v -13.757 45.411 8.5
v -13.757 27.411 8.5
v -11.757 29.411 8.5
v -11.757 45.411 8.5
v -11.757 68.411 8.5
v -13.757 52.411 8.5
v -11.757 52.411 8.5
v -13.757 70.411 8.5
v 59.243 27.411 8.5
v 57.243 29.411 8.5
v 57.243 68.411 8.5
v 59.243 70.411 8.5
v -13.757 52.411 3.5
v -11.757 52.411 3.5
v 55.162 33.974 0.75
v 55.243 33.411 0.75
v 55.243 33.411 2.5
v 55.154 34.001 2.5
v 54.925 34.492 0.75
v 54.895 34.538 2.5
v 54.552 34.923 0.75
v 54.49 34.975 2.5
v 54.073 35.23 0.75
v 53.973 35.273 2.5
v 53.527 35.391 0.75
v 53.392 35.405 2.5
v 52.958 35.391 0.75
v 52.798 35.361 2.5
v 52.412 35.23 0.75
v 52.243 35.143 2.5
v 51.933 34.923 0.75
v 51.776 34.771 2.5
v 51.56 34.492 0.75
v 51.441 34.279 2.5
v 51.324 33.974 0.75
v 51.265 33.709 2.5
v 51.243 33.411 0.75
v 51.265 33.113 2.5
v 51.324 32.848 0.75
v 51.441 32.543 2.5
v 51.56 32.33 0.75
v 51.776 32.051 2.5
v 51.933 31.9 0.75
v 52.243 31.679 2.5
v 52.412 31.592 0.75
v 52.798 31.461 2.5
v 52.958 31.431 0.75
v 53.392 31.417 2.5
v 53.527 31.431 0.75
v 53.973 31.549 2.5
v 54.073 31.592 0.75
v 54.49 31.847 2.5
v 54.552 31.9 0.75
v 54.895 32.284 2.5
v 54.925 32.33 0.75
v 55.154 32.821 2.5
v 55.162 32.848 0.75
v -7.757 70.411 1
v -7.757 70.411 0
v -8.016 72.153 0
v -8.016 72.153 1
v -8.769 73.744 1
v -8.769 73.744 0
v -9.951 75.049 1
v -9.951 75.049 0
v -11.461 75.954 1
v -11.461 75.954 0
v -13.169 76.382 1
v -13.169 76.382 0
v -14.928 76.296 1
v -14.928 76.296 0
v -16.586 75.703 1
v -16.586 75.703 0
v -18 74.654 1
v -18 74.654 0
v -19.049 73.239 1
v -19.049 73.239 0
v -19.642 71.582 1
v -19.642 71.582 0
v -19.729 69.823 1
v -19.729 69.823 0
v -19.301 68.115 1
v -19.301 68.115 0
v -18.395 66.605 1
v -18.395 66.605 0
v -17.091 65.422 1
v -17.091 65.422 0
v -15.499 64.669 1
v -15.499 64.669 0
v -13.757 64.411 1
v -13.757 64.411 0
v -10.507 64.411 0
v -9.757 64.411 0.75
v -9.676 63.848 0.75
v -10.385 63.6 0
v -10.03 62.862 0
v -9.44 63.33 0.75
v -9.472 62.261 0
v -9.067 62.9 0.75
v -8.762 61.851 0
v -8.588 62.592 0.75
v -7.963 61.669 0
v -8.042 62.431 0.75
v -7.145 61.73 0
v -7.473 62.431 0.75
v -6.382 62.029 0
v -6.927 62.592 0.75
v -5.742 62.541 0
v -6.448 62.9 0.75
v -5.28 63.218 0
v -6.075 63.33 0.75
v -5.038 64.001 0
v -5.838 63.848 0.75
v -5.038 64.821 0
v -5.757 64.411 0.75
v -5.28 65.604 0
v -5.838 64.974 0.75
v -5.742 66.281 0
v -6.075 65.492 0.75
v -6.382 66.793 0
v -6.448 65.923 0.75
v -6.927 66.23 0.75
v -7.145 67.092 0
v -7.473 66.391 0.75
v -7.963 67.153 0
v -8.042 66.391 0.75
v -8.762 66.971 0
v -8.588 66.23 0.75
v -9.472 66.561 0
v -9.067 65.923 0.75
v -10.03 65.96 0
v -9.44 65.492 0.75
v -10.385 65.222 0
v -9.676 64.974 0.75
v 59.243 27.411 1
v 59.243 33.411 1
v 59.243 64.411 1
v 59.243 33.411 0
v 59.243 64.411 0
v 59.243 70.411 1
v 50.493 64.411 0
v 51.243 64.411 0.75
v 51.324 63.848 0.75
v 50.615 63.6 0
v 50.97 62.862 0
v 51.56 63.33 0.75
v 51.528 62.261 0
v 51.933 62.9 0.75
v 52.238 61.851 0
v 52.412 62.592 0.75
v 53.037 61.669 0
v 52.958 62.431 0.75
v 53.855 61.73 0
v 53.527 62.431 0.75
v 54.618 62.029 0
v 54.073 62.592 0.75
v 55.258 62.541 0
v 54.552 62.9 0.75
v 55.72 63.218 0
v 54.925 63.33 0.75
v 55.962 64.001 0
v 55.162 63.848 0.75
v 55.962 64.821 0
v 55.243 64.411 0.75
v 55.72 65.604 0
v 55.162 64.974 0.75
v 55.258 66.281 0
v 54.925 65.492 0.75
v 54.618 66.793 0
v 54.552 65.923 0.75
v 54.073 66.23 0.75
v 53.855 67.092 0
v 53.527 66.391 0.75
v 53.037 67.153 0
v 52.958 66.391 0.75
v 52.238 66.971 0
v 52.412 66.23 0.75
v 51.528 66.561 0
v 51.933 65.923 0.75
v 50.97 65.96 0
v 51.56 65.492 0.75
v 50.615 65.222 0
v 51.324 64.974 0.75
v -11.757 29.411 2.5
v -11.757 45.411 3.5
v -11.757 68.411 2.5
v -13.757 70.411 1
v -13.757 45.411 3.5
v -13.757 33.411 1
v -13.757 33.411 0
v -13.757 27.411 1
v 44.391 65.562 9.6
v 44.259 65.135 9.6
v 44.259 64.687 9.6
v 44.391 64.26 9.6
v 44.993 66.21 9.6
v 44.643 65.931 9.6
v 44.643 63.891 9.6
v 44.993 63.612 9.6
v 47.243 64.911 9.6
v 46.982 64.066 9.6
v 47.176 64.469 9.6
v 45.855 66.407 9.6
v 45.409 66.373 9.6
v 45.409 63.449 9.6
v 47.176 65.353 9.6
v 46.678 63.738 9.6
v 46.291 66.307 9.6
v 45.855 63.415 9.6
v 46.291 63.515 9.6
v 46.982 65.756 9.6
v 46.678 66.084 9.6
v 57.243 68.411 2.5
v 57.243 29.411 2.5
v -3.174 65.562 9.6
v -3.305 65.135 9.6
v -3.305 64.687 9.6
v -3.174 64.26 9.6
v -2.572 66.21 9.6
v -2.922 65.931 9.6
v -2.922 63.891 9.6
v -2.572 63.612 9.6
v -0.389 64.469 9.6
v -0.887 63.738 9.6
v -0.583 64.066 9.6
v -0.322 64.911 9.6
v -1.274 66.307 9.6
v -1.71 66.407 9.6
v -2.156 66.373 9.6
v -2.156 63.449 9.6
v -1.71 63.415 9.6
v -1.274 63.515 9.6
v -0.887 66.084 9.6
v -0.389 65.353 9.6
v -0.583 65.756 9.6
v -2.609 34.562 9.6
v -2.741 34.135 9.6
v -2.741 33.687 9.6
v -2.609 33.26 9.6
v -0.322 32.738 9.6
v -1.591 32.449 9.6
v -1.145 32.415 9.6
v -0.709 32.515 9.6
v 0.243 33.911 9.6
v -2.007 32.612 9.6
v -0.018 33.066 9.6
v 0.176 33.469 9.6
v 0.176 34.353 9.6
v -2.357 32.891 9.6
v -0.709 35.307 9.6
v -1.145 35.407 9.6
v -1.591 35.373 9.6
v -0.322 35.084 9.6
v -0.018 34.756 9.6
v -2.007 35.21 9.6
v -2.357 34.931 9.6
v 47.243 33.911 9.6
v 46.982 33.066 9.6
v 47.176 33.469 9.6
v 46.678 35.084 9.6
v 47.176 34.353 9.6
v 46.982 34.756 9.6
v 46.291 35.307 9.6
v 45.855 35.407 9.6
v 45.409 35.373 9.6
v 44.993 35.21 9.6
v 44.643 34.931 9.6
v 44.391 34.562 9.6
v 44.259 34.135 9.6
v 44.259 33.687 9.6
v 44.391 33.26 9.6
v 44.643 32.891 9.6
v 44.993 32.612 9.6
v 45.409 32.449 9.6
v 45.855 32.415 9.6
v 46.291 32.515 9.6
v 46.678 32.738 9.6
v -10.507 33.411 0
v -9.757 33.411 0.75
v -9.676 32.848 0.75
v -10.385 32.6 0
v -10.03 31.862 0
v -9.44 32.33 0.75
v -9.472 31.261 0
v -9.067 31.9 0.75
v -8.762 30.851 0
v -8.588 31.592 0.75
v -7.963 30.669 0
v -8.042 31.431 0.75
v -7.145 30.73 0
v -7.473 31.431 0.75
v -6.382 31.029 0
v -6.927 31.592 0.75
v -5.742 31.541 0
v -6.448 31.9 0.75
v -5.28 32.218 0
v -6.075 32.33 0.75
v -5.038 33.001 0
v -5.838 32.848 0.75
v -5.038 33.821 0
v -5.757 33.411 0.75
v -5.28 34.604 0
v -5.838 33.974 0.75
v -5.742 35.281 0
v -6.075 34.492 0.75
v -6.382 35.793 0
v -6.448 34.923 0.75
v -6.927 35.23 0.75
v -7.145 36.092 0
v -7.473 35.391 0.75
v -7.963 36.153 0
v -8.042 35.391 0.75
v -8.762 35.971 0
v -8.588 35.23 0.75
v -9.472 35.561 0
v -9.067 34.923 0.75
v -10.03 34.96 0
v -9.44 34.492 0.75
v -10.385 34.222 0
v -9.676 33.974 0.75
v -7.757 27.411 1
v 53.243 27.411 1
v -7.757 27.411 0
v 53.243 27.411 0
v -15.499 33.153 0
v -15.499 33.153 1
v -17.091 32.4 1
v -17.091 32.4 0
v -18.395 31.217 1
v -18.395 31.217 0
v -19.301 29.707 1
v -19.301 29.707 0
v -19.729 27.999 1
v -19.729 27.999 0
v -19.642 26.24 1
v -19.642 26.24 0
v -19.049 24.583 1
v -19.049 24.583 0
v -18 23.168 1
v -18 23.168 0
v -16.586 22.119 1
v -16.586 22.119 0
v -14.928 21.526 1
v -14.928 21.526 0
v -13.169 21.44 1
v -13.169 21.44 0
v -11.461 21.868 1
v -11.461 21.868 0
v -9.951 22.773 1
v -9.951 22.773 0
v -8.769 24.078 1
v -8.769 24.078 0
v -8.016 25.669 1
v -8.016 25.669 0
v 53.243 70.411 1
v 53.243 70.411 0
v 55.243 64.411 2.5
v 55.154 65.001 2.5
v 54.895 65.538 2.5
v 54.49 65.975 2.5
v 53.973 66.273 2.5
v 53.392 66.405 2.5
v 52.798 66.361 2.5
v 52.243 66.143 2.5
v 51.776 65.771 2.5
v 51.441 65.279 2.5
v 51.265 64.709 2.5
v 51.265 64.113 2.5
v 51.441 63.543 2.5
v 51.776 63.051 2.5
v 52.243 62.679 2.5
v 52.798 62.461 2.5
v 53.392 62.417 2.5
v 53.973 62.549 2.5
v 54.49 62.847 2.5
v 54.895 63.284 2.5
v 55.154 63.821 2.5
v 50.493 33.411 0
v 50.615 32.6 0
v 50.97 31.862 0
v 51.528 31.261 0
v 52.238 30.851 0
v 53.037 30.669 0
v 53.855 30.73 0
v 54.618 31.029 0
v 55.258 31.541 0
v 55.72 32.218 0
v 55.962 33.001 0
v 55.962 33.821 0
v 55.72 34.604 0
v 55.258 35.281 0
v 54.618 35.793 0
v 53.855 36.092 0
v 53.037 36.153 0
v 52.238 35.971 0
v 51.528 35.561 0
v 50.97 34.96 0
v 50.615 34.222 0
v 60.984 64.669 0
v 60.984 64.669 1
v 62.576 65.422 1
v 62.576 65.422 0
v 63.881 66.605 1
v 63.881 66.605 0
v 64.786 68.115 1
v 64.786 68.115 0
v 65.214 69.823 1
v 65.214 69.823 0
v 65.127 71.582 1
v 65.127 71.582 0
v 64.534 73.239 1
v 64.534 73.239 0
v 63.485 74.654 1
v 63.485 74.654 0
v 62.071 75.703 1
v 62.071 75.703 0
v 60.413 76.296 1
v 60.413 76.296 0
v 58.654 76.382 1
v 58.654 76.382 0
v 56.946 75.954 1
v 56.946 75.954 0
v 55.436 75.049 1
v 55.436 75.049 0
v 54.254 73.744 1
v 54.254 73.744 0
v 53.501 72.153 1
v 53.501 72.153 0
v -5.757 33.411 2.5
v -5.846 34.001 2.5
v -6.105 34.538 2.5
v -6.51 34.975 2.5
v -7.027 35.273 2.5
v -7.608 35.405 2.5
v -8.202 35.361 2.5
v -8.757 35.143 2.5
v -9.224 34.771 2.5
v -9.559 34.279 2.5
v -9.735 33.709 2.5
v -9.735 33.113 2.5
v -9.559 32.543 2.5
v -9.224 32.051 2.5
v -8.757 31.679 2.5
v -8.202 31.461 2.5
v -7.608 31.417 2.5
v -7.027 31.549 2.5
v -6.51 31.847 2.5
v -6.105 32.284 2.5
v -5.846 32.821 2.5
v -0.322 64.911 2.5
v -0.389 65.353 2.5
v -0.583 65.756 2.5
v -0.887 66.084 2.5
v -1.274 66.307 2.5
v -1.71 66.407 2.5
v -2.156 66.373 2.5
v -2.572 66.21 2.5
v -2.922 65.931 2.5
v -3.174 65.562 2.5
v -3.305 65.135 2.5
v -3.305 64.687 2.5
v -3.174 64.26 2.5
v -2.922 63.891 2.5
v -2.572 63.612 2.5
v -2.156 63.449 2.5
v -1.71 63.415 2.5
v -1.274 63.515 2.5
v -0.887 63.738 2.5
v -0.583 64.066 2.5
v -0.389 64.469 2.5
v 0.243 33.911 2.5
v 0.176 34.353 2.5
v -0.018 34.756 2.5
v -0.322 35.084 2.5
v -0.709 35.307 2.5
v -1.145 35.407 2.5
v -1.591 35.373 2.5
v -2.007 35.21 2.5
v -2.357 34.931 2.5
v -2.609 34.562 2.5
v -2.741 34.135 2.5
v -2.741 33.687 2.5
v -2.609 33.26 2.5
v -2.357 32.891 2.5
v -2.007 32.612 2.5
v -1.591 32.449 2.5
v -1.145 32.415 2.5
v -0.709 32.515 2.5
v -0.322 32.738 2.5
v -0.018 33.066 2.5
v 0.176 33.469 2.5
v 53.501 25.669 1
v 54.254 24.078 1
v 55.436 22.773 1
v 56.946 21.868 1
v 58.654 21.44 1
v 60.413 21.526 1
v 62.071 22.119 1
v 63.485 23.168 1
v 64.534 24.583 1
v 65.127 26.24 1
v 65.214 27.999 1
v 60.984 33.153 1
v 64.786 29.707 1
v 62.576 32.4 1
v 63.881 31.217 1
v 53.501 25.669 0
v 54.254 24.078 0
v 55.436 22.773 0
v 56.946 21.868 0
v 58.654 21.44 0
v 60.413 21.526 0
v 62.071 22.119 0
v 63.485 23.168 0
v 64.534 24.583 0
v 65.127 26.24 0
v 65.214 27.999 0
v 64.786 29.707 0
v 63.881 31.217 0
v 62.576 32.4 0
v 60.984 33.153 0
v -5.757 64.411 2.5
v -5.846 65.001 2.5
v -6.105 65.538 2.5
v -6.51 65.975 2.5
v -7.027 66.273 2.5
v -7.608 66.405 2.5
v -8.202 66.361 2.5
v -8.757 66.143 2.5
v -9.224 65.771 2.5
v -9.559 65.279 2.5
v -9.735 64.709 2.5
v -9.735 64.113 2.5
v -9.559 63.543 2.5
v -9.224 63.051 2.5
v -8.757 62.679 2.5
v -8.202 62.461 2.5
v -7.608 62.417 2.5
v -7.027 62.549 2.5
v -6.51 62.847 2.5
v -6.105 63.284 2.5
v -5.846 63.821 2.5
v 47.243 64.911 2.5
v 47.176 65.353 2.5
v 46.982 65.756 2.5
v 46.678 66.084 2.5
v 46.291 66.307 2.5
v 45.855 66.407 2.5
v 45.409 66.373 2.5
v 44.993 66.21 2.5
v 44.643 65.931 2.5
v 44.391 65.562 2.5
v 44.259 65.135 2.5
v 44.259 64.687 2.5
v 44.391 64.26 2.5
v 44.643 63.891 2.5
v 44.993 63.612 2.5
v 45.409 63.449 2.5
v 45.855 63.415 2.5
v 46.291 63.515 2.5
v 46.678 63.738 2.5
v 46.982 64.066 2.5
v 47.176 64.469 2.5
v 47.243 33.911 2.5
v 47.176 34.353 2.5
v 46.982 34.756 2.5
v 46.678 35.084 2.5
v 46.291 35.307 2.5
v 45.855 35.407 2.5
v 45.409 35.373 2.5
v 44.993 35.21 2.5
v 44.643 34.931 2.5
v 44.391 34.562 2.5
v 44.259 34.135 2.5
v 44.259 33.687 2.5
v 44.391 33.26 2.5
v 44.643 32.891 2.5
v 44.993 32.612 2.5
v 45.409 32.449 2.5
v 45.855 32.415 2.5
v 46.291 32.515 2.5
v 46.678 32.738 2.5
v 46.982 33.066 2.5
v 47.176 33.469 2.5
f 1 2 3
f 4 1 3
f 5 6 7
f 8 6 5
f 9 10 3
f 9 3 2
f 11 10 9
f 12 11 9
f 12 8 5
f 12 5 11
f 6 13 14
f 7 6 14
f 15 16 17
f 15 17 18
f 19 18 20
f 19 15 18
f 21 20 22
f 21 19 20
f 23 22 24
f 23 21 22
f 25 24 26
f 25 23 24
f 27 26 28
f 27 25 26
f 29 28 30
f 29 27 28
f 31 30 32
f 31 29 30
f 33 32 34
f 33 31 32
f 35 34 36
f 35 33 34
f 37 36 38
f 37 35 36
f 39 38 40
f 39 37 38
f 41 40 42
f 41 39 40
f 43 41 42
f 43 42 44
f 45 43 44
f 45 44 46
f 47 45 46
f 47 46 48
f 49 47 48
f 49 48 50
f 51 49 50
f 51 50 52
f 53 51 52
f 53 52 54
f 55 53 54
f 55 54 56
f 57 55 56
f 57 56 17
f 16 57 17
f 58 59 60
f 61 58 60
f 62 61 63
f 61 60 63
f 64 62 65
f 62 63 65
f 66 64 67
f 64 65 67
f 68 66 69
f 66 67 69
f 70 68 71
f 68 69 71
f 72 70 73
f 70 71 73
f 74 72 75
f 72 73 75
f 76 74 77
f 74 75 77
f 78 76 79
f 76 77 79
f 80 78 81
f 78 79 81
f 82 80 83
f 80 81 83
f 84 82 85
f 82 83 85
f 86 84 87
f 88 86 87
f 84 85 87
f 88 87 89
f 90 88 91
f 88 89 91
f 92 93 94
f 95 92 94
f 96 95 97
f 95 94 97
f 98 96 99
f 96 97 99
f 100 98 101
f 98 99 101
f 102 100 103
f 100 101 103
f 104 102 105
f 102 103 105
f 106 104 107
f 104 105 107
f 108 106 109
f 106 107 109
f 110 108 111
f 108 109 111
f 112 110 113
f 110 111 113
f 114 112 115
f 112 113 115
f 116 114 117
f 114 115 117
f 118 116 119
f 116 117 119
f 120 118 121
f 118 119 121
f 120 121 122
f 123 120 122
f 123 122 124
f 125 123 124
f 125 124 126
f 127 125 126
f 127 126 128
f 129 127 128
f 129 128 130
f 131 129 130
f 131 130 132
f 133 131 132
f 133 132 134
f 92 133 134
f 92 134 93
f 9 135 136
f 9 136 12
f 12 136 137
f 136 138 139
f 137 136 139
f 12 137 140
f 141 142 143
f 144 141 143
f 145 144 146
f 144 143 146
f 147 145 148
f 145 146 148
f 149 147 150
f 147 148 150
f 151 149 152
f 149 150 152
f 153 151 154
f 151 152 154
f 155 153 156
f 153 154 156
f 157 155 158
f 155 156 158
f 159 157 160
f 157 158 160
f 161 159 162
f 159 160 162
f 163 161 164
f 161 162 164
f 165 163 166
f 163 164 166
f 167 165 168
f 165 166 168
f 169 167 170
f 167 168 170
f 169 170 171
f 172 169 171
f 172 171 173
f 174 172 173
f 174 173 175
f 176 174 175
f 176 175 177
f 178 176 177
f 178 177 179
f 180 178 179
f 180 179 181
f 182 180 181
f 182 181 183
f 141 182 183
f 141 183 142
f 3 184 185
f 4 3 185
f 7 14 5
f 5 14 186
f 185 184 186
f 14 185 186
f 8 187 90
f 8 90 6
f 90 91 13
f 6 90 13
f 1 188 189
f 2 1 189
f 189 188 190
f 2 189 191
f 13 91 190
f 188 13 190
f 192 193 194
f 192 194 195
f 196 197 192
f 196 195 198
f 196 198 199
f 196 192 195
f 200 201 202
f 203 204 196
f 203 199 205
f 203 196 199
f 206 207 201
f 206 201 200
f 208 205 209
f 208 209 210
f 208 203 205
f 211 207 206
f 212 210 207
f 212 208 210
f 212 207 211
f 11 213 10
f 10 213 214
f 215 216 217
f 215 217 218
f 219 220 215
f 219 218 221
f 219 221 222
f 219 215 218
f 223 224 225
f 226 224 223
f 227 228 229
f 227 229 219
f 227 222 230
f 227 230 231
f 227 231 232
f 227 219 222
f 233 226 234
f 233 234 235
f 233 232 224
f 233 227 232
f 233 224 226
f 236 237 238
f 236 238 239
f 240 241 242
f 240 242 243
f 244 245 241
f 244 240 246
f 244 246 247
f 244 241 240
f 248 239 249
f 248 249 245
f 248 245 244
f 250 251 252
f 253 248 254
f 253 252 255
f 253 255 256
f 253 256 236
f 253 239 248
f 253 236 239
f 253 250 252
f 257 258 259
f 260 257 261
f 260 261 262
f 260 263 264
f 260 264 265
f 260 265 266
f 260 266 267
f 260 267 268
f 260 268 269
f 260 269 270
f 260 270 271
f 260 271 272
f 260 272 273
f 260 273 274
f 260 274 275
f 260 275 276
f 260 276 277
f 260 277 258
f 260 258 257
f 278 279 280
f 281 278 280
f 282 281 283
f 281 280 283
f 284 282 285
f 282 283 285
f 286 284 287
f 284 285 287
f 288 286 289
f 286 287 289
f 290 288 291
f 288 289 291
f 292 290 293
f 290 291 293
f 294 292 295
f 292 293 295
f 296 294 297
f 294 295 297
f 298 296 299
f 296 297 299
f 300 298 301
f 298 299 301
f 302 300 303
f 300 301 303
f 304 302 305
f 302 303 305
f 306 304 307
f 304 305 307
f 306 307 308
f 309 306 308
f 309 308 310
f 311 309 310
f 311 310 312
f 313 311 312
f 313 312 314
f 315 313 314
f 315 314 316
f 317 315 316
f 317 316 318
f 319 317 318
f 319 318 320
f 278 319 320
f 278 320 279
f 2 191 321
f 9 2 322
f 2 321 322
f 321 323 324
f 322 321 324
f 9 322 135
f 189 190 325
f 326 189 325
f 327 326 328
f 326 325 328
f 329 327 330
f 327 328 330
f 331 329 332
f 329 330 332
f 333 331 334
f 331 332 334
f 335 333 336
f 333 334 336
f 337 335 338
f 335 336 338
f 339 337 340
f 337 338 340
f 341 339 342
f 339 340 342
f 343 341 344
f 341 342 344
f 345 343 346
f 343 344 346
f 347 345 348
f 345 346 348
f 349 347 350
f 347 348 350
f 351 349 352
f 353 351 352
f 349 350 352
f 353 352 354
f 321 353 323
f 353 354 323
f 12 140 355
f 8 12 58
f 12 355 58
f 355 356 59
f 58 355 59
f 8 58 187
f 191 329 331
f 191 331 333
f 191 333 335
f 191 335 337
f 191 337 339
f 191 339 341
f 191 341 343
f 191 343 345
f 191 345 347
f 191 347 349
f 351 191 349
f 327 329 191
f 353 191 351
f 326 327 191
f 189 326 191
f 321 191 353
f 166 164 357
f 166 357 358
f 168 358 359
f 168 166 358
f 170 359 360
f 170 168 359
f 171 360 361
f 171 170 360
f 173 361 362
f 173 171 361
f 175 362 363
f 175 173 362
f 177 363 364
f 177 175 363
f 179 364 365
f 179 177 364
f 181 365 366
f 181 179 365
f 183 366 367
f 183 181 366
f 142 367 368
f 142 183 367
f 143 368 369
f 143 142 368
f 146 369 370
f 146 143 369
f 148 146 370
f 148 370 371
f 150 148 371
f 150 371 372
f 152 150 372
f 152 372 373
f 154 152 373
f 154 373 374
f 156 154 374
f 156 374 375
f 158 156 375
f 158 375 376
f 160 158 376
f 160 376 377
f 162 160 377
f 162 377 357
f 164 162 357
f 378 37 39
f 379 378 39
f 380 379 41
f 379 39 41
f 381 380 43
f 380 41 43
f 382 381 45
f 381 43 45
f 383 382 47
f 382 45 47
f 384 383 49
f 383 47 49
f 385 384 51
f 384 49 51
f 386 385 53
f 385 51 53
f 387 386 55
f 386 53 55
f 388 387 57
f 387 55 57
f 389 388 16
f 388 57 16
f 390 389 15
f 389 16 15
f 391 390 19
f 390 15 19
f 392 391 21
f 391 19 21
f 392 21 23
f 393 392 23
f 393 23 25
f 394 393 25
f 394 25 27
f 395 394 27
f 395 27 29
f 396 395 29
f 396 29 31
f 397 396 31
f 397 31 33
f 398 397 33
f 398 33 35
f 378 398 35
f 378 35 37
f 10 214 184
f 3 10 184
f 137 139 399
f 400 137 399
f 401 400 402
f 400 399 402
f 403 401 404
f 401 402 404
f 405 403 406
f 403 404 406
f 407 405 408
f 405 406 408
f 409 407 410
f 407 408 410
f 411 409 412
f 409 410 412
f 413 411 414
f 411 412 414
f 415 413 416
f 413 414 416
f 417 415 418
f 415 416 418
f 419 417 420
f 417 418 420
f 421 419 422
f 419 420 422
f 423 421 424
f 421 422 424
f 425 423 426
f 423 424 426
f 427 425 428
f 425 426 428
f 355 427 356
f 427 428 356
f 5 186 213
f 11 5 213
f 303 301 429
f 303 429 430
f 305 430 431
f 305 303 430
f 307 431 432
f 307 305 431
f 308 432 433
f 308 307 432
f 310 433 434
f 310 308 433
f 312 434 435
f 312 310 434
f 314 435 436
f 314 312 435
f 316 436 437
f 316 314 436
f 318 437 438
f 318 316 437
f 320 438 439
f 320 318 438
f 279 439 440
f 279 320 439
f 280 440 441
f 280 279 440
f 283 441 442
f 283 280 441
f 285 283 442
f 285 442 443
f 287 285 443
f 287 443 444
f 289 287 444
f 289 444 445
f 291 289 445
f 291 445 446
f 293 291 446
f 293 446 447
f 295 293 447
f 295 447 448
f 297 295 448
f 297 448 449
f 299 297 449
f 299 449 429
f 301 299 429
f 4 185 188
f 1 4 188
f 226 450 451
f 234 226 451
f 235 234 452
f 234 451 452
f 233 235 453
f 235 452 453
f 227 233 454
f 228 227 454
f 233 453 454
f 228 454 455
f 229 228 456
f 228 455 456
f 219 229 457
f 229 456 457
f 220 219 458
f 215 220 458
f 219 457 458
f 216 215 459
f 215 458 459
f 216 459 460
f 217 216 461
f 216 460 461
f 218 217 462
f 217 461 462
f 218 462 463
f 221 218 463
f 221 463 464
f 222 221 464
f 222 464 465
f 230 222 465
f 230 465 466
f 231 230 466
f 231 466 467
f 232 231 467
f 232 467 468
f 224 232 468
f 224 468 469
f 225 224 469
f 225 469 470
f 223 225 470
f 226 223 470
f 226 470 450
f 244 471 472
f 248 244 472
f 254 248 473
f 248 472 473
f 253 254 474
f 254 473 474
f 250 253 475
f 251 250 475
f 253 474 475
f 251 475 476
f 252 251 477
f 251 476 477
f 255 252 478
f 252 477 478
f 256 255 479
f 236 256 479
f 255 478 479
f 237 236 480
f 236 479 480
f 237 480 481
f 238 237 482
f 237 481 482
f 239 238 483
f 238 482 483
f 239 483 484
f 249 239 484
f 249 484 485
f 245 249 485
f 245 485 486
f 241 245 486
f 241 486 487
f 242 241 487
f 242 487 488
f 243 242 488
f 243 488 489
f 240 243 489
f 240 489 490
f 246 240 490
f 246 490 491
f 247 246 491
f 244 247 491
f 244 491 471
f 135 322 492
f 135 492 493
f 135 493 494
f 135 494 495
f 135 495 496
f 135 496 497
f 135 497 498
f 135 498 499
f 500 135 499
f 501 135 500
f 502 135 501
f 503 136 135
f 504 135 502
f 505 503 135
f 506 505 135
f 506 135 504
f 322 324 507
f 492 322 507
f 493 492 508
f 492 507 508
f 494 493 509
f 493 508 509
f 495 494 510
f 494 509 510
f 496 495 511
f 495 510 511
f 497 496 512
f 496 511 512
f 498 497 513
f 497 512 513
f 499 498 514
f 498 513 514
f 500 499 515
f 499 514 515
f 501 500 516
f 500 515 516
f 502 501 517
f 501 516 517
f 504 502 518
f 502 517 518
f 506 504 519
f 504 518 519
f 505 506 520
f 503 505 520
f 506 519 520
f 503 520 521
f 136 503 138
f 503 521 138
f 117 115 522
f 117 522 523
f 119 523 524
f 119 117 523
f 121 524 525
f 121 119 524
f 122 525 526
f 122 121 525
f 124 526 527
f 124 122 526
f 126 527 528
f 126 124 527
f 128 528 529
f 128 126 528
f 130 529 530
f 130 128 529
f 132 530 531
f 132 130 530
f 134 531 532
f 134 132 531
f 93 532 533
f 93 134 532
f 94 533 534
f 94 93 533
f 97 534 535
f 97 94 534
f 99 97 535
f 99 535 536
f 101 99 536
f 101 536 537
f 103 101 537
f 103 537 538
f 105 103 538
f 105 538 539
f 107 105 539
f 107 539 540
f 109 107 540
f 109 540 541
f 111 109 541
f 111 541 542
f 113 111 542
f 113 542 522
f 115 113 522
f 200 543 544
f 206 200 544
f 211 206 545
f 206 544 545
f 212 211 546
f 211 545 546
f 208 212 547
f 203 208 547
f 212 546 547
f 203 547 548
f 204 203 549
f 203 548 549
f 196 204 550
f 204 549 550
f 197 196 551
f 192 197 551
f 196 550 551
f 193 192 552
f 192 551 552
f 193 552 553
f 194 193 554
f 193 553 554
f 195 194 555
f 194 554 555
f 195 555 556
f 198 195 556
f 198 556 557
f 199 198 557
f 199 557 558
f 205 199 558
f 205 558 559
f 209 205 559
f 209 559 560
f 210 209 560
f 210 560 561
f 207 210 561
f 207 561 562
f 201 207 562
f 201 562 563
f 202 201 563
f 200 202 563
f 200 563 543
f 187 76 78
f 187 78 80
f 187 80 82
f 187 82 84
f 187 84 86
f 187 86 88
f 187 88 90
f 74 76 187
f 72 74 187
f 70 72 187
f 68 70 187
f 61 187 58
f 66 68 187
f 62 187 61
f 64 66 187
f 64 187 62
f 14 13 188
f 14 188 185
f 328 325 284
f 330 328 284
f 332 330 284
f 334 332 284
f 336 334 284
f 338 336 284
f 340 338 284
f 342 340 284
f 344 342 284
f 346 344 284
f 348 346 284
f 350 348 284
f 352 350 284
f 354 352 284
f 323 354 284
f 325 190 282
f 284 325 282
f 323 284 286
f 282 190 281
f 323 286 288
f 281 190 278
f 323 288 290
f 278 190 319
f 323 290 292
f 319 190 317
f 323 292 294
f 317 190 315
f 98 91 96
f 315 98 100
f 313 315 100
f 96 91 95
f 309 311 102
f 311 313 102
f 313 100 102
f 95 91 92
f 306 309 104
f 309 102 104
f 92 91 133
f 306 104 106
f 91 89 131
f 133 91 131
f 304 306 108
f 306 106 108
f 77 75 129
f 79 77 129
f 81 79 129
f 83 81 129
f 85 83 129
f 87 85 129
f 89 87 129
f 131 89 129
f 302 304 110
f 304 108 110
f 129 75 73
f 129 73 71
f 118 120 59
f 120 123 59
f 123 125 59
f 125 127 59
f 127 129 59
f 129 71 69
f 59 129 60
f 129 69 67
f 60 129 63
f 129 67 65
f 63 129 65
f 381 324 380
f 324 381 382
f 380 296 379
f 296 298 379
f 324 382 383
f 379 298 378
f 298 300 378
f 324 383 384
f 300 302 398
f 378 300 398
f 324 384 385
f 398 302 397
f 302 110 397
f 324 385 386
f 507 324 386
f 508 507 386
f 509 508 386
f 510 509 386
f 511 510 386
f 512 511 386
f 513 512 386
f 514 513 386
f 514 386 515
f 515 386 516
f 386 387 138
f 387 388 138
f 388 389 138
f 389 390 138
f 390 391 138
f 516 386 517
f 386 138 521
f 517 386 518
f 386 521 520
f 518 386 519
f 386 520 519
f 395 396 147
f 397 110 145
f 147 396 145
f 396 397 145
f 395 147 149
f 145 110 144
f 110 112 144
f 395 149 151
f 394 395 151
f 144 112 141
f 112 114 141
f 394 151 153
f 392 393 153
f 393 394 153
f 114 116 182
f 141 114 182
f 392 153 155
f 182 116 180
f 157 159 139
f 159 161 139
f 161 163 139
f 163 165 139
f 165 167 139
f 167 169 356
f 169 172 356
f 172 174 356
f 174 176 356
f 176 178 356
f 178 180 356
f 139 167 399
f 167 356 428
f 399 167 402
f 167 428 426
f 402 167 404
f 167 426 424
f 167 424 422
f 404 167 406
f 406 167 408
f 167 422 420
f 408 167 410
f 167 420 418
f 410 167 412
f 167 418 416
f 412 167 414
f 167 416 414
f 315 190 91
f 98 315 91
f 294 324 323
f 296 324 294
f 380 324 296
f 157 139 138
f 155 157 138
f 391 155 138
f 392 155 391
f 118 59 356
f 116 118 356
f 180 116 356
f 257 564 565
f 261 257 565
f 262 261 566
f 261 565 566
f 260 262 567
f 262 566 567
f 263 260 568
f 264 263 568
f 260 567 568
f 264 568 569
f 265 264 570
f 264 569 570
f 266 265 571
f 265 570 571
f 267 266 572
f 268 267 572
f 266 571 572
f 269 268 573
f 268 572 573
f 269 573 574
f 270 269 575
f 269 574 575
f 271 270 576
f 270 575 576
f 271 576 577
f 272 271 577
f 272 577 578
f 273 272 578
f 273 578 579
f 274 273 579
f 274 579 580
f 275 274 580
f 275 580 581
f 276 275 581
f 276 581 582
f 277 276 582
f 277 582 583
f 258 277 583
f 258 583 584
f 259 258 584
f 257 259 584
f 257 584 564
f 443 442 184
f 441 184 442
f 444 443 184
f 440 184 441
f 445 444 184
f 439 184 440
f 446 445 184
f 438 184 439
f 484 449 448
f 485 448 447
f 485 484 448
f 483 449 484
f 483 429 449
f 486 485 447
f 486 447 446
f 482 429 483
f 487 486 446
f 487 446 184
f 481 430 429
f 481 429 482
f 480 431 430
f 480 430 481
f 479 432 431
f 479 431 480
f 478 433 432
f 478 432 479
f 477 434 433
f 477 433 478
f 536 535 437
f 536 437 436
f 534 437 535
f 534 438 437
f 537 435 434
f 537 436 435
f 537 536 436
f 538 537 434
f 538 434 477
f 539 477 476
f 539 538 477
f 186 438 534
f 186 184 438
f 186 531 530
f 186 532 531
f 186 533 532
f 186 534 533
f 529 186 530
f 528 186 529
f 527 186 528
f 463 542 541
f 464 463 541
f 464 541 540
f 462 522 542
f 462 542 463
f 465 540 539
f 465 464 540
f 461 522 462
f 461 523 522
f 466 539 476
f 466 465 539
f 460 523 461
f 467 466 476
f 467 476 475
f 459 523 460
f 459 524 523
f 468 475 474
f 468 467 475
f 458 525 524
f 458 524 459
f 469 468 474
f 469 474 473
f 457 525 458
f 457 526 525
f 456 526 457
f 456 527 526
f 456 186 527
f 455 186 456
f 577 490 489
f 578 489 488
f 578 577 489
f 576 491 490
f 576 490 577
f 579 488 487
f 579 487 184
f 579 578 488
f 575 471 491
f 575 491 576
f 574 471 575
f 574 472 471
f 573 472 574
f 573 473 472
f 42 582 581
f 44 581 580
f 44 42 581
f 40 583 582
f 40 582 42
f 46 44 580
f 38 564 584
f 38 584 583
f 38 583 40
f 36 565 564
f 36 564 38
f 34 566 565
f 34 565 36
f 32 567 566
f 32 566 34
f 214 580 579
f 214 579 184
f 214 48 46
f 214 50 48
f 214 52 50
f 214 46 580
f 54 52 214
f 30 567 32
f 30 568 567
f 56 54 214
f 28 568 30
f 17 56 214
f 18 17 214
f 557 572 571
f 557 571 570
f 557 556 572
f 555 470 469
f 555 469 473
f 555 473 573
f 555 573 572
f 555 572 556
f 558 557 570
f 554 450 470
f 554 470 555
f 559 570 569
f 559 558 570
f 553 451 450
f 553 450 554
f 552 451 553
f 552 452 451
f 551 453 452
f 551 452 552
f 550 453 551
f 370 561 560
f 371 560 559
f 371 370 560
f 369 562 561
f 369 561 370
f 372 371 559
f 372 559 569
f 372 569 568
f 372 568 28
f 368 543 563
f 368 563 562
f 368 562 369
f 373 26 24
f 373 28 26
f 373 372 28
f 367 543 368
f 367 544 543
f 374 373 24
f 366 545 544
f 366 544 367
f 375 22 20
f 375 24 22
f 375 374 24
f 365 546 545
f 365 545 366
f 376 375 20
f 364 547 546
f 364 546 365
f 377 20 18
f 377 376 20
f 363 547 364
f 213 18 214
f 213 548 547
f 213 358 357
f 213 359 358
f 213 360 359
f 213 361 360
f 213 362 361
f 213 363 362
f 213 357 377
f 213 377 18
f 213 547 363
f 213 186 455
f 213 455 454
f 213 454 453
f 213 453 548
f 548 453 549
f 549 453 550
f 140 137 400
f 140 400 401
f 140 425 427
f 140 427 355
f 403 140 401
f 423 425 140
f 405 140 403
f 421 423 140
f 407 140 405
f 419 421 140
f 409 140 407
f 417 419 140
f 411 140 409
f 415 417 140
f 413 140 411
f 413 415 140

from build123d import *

# Parameters (mm, degrees)
F0_R           = 2
F0_R_2         = 1.5
F0_W           = 2
F0_H           = 7
F1_DEPTH       = 2.5
F2_DEPTH       = 8.5
F3_DEPTH       = 9.6
F4_DEPTH       = 3.5
F5_D           = 3
F5_CSINK_D     = 5.5
F5_CSINK_ANGLE = 90
F6_DEPTH       = 1


with BuildPart() as f1:
    # F0 (on Top) → F1 (new body)
    with BuildSketch(Plane.XY):
        Polygon((57.2425711751, 68.4110085815), (-11.7574288249, 68.4110085815), (-11.7574288249, 52.4110085815), (-11.7574288249, 45.4110085815), (-11.7574288249, 29.4110085815), (57.2425711751, 29.4110085815), align=None)
        with Locations((-7.7574288249, 33.4110085815)):
            Circle(F0_R, mode=Mode.SUBTRACT)
        with Locations((-1.2574288249, 33.9110085815)):
            Circle(F0_R_2, mode=Mode.SUBTRACT)
        with Locations((45.7425711751, 33.9110085815)):
            Circle(F0_R_2, mode=Mode.SUBTRACT)
        with Locations((53.2425711751, 33.4110085815)):
            Circle(F0_R, mode=Mode.SUBTRACT)
        with Locations((-7.7574288249, 64.4110085815)):
            Circle(F0_R, mode=Mode.SUBTRACT)
        with Locations((-1.8220887287, 64.9110085815)):
            Circle(F0_R_2, mode=Mode.SUBTRACT)
        with Locations((45.7425711751, 64.9110085815)):
            Circle(F0_R_2, mode=Mode.SUBTRACT)
        with Locations((53.2425711751, 64.4110085815)):
            Circle(F0_R, mode=Mode.SUBTRACT)
        Polygon((-11.7574288249, 52.4110085815), (-11.7574288249, 68.4110085815), (57.2425711751, 68.4110085815), (57.2425711751, 29.4110085815), (-11.7574288249, 29.4110085815), (-11.7574288249, 45.4110085815), (-13.7574288249, 45.4110085815), (-13.7574288249, 33.4110085815), (-13.7574288249, 27.4110085815), (-7.7574288249, 27.4110085815), (53.2425711751, 27.4110085815), (59.2425711751, 27.4110085815), (59.2425711751, 33.4110085815), (59.2425711751, 64.4110085815), (59.2425711751, 70.4110085815), (53.2425711751, 70.4110085815), (-7.7574288249, 70.4110085815), (-13.7574288249, 70.4110085815), (-13.7574288249, 64.4110085815), (-13.7574288249, 52.4110085815), align=None)
        with Locations((-1.2574288249, 33.9110085815)):
            Circle(F0_R_2)
        with Locations((45.7425711751, 33.9110085815)):
            Circle(F0_R_2)
        with Locations((45.7425711751, 64.9110085815)):
            Circle(F0_R_2)
        with Locations((-1.8220887287, 64.9110085815)):
            Circle(F0_R_2)
        with Locations((-12.7574288249, 48.9110085815)):
            Rectangle(F0_W, F0_H)
    extrude(amount=F1_DEPTH)

    # F0 (on Top) → F2 (join)
    with BuildSketch(Plane.XY):
        Polygon((-11.7574288249, 52.4110085815), (-11.7574288249, 68.4110085815), (57.2425711751, 68.4110085815), (57.2425711751, 29.4110085815), (-11.7574288249, 29.4110085815), (-11.7574288249, 45.4110085815), (-13.7574288249, 45.4110085815), (-13.7574288249, 33.4110085815), (-13.7574288249, 27.4110085815), (-7.7574288249, 27.4110085815), (53.2425711751, 27.4110085815), (59.2425711751, 27.4110085815), (59.2425711751, 33.4110085815), (59.2425711751, 64.4110085815), (59.2425711751, 70.4110085815), (53.2425711751, 70.4110085815), (-7.7574288249, 70.4110085815), (-13.7574288249, 70.4110085815), (-13.7574288249, 64.4110085815), (-13.7574288249, 52.4110085815), align=None)
    extrude(amount=F2_DEPTH)

    # F0 (on Top) → F3 (join)
    with BuildSketch(Plane.XY):
        with Locations((-1.8220887287, 64.9110085815)):
            Circle(F0_R_2)
        with Locations((-1.2574288249, 33.9110085815)):
            Circle(F0_R_2)
        with Locations((45.7425711751, 33.9110085815)):
            Circle(F0_R_2)
        with Locations((45.7425711751, 64.9110085815)):
            Circle(F0_R_2)
    extrude(amount=F3_DEPTH)

    # F0 (on Top) → F4 (join)
    with BuildSketch(Plane.XY):
        with Locations((-12.7574288249, 48.9110085815)):
            Rectangle(F0_W, F0_H)
    extrude(amount=F4_DEPTH)

    # F5 (through all)
    with Locations(Plane(origin=(0, 0, 0), x_dir=(1, 0, 0), z_dir=(0, 0, -1))):
        with Locations((53.2425711751, -64.4110085815), (53.2425711751, -33.4110085815), (-7.7574288249, -33.4110085815), (-7.7574288249, -64.4110085815)):
            CounterSinkHole(F5_D / 2, F5_CSINK_D / 2, counter_sink_angle=F5_CSINK_ANGLE)

    # F0 (on Top) → F6 (join)
    with BuildSketch(Plane.XY):
        with BuildLine():
            ThreePointArc((-7.7574288249, 70.4110085815), (-18.000069512, 74.6536492686), (-13.7574288249, 64.4110085815))
            Line((-13.7574288249, 64.4110085815), (-13.7574288249, 70.4110085815))
            Line((-13.7574288249, 70.4110085815), (-7.7574288249, 70.4110085815))
        make_face()
        with BuildLine():
            ThreePointArc((59.2425711751, 64.4110085815), (63.4852118622, 74.6536492686), (53.2425711751, 70.4110085815))
            Line((53.2425711751, 70.4110085815), (59.2425711751, 70.4110085815))
            Line((59.2425711751, 70.4110085815), (59.2425711751, 64.4110085815))
        make_face()
        with BuildLine():
            Line((59.2425711751, 27.4110085815), (53.2425711751, 27.4110085815))
            ThreePointArc((53.2425711751, 27.4110085815), (63.4852118622, 23.1683678944), (59.2425711751, 33.4110085815))
            Line((59.2425711751, 33.4110085815), (59.2425711751, 27.4110085815))
        make_face()
        with BuildLine():
            Line((-13.7574288249, 27.4110085815), (-13.7574288249, 33.4110085815))
            ThreePointArc((-13.7574288249, 33.4110085815), (-18.000069512, 23.1683678944), (-7.7574288249, 27.4110085815))
            Line((-7.7574288249, 27.4110085815), (-13.7574288249, 27.4110085815))
        make_face()
    extrude(amount=F6_DEPTH)


solid = f1.part
